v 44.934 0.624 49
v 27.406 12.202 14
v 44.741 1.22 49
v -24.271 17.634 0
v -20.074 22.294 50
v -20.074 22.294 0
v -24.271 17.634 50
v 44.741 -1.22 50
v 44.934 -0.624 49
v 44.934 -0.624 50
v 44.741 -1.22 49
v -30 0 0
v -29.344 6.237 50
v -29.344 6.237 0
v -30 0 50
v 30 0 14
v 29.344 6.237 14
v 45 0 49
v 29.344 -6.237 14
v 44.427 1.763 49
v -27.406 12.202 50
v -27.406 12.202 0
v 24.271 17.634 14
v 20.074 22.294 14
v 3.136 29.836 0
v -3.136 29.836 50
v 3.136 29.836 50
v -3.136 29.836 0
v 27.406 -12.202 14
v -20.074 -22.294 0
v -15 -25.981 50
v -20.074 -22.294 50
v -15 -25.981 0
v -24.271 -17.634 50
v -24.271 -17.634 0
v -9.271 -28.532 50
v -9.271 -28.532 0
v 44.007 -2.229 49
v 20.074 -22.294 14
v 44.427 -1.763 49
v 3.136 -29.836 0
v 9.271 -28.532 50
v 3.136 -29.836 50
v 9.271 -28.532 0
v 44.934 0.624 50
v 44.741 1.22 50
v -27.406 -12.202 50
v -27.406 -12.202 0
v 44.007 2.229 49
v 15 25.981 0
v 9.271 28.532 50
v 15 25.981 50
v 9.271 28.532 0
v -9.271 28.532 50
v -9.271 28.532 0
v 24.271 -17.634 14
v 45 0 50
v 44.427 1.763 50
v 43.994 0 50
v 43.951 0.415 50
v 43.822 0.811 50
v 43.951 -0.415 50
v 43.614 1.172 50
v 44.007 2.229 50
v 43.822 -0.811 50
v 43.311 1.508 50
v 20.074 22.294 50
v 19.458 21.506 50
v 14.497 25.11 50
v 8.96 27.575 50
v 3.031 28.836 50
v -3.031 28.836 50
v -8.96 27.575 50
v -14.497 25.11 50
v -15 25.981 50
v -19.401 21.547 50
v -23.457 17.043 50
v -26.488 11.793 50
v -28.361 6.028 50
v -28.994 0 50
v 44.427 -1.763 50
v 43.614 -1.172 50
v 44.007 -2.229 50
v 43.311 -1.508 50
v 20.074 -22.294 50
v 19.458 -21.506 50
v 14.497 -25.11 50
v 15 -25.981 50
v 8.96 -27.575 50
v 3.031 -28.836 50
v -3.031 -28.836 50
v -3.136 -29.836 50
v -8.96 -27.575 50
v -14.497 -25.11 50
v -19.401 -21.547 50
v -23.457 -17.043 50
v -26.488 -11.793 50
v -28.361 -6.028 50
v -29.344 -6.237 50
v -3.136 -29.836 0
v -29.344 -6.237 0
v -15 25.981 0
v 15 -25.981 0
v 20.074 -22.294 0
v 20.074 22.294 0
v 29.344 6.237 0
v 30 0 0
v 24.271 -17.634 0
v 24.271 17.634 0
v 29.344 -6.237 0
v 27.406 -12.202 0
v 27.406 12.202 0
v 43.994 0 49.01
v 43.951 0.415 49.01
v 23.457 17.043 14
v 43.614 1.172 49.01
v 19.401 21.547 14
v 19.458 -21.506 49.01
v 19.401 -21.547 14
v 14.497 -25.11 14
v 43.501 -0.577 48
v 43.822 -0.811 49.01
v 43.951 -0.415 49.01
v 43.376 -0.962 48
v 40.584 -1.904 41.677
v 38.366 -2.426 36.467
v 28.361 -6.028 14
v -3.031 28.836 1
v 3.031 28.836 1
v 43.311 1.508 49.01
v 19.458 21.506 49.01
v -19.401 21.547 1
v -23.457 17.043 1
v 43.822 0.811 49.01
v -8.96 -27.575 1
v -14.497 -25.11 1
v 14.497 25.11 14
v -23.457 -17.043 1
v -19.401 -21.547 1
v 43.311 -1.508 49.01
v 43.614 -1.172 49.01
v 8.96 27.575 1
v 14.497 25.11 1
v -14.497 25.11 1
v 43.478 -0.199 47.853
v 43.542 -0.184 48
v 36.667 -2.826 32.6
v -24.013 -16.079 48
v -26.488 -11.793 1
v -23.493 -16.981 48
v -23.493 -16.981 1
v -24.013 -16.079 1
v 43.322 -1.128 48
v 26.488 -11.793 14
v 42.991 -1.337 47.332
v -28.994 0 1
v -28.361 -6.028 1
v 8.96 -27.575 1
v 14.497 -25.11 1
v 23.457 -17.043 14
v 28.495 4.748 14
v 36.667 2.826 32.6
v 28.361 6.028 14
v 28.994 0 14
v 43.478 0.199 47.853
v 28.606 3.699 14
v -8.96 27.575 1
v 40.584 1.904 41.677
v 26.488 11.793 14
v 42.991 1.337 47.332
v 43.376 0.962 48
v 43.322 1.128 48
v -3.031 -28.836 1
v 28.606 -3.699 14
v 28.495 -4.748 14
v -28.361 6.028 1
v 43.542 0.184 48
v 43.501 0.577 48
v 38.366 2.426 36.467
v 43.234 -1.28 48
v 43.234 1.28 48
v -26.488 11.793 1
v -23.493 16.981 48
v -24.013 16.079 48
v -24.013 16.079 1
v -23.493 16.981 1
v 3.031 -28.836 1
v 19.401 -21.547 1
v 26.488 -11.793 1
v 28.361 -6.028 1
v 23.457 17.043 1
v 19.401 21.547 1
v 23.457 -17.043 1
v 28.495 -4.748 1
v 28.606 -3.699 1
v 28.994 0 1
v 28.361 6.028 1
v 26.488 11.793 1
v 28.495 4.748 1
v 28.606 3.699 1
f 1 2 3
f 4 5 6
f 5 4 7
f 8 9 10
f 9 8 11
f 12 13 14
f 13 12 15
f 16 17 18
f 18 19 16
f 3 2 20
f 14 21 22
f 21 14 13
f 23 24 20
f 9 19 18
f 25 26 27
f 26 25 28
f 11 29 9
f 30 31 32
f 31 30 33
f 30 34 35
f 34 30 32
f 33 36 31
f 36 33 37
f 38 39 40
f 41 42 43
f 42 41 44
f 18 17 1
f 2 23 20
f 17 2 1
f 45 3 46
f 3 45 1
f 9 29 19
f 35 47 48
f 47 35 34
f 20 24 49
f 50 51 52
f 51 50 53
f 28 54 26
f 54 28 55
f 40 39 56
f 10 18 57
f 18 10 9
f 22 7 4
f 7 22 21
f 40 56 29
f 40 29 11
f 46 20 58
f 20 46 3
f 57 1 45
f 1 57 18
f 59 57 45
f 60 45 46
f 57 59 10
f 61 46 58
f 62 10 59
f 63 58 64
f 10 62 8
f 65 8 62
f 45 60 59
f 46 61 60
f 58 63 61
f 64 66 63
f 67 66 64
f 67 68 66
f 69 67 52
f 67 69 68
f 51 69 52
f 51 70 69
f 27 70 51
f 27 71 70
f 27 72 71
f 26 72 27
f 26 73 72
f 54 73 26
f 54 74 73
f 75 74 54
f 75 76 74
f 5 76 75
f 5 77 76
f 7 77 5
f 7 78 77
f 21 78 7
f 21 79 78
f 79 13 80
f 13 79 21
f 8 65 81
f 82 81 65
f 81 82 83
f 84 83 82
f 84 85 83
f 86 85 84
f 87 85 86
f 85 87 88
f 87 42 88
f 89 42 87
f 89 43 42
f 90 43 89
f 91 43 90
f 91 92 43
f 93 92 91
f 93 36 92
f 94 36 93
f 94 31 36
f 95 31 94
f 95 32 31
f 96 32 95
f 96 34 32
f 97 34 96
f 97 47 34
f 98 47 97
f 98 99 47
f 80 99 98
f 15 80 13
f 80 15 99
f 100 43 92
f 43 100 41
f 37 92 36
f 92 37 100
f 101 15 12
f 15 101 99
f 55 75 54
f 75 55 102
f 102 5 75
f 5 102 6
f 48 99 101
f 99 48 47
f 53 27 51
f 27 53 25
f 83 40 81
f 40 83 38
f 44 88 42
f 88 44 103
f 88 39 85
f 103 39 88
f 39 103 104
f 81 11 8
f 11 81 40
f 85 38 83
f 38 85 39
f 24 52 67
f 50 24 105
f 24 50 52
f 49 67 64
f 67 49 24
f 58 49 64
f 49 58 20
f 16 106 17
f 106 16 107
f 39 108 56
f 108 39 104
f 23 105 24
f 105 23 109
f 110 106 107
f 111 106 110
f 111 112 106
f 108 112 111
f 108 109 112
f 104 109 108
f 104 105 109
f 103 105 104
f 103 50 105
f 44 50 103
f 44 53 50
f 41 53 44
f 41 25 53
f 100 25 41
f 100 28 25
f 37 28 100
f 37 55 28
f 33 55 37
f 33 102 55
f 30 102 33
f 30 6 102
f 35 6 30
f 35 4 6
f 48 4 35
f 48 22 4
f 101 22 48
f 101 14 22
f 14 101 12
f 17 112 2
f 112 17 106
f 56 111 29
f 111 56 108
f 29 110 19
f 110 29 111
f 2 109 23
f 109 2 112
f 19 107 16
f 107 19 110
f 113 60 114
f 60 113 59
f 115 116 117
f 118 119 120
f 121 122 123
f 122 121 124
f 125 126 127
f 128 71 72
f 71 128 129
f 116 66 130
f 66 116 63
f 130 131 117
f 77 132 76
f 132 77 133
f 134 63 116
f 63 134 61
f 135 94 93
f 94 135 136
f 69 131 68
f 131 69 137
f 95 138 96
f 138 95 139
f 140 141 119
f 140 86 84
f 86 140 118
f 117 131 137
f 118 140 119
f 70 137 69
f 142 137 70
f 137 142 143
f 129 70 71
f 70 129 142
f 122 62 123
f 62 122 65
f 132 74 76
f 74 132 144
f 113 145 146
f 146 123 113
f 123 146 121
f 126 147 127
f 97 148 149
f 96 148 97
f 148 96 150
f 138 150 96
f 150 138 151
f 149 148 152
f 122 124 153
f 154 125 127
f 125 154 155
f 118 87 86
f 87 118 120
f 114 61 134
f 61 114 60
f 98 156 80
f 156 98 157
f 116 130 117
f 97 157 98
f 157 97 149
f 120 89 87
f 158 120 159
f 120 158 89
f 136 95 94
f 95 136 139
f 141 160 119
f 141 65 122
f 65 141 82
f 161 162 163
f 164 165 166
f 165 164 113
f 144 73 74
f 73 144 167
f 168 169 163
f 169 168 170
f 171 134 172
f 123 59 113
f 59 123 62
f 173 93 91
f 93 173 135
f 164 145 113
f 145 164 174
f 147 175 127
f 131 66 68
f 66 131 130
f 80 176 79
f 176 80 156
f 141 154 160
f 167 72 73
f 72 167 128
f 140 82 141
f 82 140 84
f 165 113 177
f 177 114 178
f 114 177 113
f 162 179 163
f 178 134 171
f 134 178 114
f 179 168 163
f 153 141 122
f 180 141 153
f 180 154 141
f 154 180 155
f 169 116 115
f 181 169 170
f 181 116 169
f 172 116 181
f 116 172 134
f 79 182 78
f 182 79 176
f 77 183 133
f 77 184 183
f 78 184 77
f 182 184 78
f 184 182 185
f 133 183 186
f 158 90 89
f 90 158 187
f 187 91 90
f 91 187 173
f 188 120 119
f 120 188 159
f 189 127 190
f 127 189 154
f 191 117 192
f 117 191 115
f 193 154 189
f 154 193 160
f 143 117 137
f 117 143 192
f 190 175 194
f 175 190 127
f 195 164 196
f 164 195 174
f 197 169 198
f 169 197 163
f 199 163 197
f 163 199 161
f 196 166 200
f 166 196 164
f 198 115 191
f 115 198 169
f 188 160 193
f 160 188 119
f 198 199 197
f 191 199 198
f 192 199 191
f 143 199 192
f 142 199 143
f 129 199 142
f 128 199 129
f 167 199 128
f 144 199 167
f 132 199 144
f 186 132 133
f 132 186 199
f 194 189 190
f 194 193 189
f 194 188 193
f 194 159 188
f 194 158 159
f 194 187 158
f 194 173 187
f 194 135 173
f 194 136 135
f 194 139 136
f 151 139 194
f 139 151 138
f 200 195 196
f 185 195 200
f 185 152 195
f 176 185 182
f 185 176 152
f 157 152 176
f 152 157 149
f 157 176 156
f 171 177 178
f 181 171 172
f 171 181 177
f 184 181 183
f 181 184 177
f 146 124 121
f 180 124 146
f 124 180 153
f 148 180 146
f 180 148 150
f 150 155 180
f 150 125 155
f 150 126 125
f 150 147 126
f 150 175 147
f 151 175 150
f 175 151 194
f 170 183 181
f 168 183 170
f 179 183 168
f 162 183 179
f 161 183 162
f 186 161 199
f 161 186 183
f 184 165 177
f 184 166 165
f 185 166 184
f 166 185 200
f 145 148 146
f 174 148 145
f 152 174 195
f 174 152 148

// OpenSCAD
$fn=30;   


height=50;
spout_troat_from_top=.7;
spout_radious_by_diameter=0.1;
diameter=60;
divisions=3;
wall_thicknesss=1;
dividers_pillback=2;
 
 makecup(height,spout_troat_from_top,spout_radious_by_diameter,diameter,divisions,wall_thicknesss,dividers_pillback);
 {

}

module makecup(
h=50,
pip=.6,
pipr=.5,
dia=40,
div=5,
wall=1){

difference()
{

 connect(h,pip,pipr,dia,div,wall){
translate([0,0,h-wall])linear_extrude(wall)top( h,pip,pipr,dia,div,wall);
translate([0,0,h*(1-pip)-wall])linear_extrude(wall)bottom(h,pip,pipr,dia,div,wall);
linear_extrude(wall)bottom(h,pip,pipr,dia,div,wall);
 }
 
difference(){
 connect(h,pip,pipr,dia,div,wall){
translate([0,0,h-wall+0.01])linear_extrude(wall)offset(-wall)top(h,pip,pipr,dia,div,wall);
translate([0,0,h*(1-pip)-wall])linear_extrude(wall)offset(-wall)bottom(h,pip,pipr,dia,div,wall);
translate([0,0,wall]) linear_extrude(wall)offset(-wall)bottom(h,pip,pipr,dia,div,wall);
 }
  l=0.9;
linear_extrude(h-dividers_pillback,convexity=100) {

 for (x=[dia/(div
     )*(div%2):dia/(div/2
     ):dia/1.5]){
 hull()
 {
     translate([((-dia/2)),x*l,0]) 
  circle(wall/2);
 
translate([((dia/2)*1.5)-((dia/2)*pipr)*-.5,0,0])  circle(wall/2);
 }
  hull()
 {
     translate([((-dia/2)),-x*l,0]) 
  circle(wall/2);
 
translate([((dia/2)*1.5)-((dia/2)*pipr)*-.5,0,0])  circle(wall/2);
 }
 }}
}

} 
}
module connect(h,pip,pipr,dia,div,wall)
{
  hull(){
      children(0);
    children(1);
  }
  hull(){
    children(1);
    children(2);
  }
    }




module bottom(h,pip,pipr,dia,div,wall)
    {
        circle(dia/2);
        
        }

module top(h,pip,pipr,dia,div,wall){
    
 hull(){ 
    bottom(h,pip,pipr,dia,div,wall);
    translate([((dia/2)*1.5)-((dia/2)*pipr),0,0])circle((dia/2)*pipr);
   }
    }

  
function rndc()=[rands(0,1,1)[0],rands(0,1,1)[0],rands(0,1,1)[0]];
  function rndR()=rands(-360,360,3) ;
function rnd(a = 1,b = 0,s = []) =
s == []?(rands(min(a,b),max(a,b),1)[0]) :(rands(min(a,b),max(a,b),1,s)[0]);
